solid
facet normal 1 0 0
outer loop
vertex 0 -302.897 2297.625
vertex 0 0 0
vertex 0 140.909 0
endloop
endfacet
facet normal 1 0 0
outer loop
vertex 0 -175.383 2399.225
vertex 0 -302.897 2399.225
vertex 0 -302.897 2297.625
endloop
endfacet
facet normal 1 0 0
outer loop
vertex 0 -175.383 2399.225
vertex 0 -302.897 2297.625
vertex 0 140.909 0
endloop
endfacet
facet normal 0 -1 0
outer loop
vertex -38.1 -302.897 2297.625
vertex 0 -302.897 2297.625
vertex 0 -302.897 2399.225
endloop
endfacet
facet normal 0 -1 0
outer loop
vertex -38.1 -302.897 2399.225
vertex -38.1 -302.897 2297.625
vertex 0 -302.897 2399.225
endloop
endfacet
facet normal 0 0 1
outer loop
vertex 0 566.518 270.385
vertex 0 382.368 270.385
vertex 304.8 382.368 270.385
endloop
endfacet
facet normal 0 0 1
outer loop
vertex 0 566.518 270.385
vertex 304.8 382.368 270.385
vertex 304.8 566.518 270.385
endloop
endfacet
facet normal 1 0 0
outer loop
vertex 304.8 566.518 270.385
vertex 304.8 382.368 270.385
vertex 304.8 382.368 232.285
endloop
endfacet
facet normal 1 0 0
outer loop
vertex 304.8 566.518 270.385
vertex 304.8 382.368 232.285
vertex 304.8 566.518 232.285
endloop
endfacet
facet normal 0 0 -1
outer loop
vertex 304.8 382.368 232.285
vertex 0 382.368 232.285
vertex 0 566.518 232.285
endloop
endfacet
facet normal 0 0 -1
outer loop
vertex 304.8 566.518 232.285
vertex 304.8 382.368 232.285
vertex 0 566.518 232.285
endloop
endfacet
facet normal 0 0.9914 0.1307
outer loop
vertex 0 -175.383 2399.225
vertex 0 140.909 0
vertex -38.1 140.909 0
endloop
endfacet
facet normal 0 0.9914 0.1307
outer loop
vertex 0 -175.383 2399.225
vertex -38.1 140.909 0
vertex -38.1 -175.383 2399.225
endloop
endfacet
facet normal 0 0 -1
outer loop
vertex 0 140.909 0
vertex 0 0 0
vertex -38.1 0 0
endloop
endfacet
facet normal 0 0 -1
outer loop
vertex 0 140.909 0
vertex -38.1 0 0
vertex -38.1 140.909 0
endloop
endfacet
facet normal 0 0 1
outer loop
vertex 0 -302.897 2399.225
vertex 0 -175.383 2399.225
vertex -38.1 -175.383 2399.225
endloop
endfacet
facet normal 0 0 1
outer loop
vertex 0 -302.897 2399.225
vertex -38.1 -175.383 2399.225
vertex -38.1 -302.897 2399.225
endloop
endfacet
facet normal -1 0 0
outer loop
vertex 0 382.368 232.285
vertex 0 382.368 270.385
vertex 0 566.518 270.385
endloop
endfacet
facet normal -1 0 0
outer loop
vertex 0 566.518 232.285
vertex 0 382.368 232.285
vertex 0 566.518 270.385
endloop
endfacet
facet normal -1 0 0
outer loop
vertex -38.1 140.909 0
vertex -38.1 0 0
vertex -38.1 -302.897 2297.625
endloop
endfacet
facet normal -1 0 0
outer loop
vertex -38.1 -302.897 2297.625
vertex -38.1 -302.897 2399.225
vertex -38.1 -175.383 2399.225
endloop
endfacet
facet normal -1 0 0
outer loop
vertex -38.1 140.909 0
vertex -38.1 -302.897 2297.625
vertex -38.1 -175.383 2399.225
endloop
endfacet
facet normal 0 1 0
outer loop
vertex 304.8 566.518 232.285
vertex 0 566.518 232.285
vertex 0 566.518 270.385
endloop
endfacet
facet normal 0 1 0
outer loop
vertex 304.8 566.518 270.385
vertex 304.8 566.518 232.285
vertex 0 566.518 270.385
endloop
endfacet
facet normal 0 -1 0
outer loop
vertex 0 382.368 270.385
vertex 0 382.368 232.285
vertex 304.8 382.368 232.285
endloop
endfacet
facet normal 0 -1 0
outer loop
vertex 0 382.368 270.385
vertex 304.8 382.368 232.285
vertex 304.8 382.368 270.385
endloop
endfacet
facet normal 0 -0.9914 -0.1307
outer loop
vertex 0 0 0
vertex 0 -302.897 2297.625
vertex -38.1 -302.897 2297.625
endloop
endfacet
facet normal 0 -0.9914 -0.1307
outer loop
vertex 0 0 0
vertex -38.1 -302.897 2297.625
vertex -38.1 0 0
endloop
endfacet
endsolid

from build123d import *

# Parameters (mm, degrees)
F2_DEPTH = 38.1
F3_W     = 184.15
F3_H     = 38.1
F4_DEPTH = 304.8
F8_DEPTH = 38.101


with BuildPart() as f2:
    # F1 (on Right) → F2 (new body)
    with BuildSketch(Plane.YZ):
        Polygon((-175.3825679335, 2399.2246268326), (-316.2912839668, 2399.2246268326), (0, 0), (140.9087160332, 0), align=None)
    extrude(amount=-F2_DEPTH)

    # F7 (on face) → F8 (cut, through all)
    with BuildSketch(Plane.YZ):
        Polygon((-302.8972923865, 2399.2246268326), (-316.2912839668, 2399.2246268326), (-302.8972923865, 2297.6246268326), align=None)
    extrude(amount=-F8_DEPTH, mode=Mode.SUBTRACT)


with BuildPart() as f4:
    # F3 (on Right) → F4 (new body)
    with BuildSketch(Plane.YZ):
        with Locations((474.4427301407, 251.3345607996)):
            Rectangle(F3_W, F3_H)
    extrude(amount=F4_DEPTH)


solid = Compound([f2.part, f4.part])
